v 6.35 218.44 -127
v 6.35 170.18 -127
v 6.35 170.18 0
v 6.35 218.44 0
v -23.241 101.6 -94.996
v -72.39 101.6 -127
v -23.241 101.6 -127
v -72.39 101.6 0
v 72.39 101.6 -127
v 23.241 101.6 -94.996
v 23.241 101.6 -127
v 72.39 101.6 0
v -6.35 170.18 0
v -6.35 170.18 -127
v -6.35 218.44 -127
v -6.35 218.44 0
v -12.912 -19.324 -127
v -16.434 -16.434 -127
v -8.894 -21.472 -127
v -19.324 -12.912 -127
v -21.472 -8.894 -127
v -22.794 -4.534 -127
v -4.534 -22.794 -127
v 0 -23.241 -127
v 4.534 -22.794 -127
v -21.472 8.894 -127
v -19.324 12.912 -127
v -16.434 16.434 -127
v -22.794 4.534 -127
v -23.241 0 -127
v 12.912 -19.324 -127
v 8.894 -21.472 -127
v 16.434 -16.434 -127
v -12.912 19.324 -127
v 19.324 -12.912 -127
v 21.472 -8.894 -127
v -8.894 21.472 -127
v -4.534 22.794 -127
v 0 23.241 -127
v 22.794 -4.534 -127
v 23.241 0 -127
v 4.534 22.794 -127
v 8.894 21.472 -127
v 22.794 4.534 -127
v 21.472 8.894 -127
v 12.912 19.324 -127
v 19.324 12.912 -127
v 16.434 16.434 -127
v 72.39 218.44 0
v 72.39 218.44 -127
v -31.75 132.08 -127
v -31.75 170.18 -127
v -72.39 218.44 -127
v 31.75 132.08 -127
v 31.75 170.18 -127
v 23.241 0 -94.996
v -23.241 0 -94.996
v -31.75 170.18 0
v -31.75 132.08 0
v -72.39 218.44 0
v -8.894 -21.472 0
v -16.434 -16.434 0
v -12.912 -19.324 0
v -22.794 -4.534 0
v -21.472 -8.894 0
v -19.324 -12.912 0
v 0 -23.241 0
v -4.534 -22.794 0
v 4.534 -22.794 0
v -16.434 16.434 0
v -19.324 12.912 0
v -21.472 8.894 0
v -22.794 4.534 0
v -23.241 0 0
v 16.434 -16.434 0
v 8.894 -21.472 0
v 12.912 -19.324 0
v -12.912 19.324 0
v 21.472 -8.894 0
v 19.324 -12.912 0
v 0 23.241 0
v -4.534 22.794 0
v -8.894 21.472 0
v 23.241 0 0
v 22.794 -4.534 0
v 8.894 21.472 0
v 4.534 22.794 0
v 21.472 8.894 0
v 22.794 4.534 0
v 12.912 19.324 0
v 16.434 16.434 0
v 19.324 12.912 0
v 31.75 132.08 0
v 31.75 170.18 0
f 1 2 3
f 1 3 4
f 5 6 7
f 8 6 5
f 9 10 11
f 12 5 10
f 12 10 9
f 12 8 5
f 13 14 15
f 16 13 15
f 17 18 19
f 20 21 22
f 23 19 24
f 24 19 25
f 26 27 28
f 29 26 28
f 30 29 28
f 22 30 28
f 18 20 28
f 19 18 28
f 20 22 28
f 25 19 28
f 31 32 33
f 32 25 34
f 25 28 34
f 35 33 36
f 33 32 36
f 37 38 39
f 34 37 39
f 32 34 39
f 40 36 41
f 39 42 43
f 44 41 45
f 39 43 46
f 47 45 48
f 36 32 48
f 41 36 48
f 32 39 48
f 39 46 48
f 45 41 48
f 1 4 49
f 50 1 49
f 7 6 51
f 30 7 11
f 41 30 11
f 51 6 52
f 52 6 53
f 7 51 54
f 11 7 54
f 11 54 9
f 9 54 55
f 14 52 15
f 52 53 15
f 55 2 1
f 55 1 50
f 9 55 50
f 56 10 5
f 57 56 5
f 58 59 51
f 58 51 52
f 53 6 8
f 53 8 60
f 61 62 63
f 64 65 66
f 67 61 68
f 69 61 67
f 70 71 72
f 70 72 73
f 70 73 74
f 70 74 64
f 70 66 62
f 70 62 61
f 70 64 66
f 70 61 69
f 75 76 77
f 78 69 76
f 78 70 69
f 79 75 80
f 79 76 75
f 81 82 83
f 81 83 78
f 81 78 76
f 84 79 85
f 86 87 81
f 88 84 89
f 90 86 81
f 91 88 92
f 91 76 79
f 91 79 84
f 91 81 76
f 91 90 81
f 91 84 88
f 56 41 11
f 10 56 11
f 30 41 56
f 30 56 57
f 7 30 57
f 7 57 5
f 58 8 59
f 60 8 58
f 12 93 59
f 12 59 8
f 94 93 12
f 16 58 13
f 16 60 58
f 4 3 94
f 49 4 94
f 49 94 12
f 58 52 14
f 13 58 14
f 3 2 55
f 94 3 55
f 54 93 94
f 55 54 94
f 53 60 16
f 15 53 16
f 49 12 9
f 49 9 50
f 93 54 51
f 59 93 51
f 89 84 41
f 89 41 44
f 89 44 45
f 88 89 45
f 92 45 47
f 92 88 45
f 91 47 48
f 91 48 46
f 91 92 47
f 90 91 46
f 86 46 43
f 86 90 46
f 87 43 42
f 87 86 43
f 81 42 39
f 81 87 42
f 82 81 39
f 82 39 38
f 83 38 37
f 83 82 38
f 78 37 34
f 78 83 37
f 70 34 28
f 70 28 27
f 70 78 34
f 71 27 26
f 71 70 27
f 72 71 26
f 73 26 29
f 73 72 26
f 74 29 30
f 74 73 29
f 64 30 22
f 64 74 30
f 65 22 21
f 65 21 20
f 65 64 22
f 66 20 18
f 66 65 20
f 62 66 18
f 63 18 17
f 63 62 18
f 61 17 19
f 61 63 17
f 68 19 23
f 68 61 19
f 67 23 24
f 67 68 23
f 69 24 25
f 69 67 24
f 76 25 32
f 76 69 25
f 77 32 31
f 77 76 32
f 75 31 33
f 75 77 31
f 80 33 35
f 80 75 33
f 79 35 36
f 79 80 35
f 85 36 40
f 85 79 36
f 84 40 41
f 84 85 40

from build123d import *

# Parameters (mm, degrees)
SKETCH1_R    = 23.241
FTA_DEPTH    = 127
SKETCH2_W    = 46.482
SKETCH2_H    = 101.6
FTB_DEPTH    = 32.004
FTC_DEPTH    = 127
SKETCH4_W    = 40.64
SKETCH4_H    = 38.1
FTD1_DEPTH   = 127
SKETCH4_5_W  = 40.64
SKETCH4_5_H  = 38.1
FTD2_DEPTH   = 127
SKETCH5_W    = 25.4
SKETCH5_H    = 48.26
FTE_DEPTH    = 127
FTE_2_DEPTH  = 127
SKETCH6_W    = 40.64
SKETCH6_H    = 48.26
SKETCH6_H_2  = 30.48
FILLER_DEPTH = 127


with BuildPart() as part:
    # Sketch1 → ftA (new body)
    with BuildSketch(Plane.XY):
        Circle(SKETCH1_R)
    extrude(amount=-FTA_DEPTH)


with BuildPart() as body_2:
    # Sketch2 → ftB (new body)
    with BuildSketch(Plane(origin=(0, 0, -127), x_dir=(-1, 0, 0), z_dir=(0, 0, -1))):
        with Locations((0, 50.8)):
            Rectangle(SKETCH2_W, SKETCH2_H)
    extrude(amount=-FTB_DEPTH)

    # Sketch3 → ftC (add)
    with BuildSketch(Plane(origin=(0, 0, -127), x_dir=(-1, 0, 0), z_dir=(0, 0, -1))):
        Polygon((-23.241, 101.6), (-31.75, 101.6), (-31.75, 132.08), (31.75, 132.08), (31.75, 101.6), (23.241, 101.6), align=None)
    extrude(amount=-FTC_DEPTH)



with BuildPart() as body_3:
    # Sketch4 → ftD1 (new body)
    with BuildSketch(Plane.XY):
        with Locations((52.07, 151.13)):
            Rectangle(SKETCH4_W, SKETCH4_H)
    extrude(amount=-FTD1_DEPTH)

    # Sketch4<5> → ftD2 (add)
    with BuildSketch(Plane.XY):
        with Locations((-52.07, 151.13)):
            Rectangle(SKETCH4_5_W, SKETCH4_5_H)
        with Locations((52.07, 151.13)):
            Rectangle(SKETCH4_5_W, SKETCH4_5_H)
    extrude(amount=-FTD2_DEPTH)


with BuildPart() as ftd2_piece_1:
    # of the separate pieces the step leaves, piece 1, a body of its own (ftd2_pieces)
    add(body_3.part.solids().sort_by_distance((31.75, 132.08, 0))[0])


with BuildPart() as ftd2_piece_2:
    # of the separate pieces the step leaves, piece 2, a body of its own (ftd2_pieces)
    add(body_3.part.solids().sort_by_distance((-31.75, 132.08, 0))[0])


with BuildPart() as body_5:
    # Sketch5 → ftE (new body)
    with BuildSketch(Plane.XY):
        with Locations((-19.05, 194.31)):
            Rectangle(SKETCH5_W, SKETCH5_H)
    extrude(amount=-FTE_DEPTH)


with BuildPart() as body_6:
    # Sketch5 → ftE 2 (new body)
    with BuildSketch(Plane.XY):
        with Locations((19.05, 194.31)):
            Rectangle(SKETCH5_W, SKETCH5_H)
    extrude(amount=-FTE_2_DEPTH)


with BuildPart() as body_2_1:
    add(body_2.part)

    add(ftd2_piece_1.part)  # Filler merges ftD2 piece 1

    add(ftd2_piece_2.part)  # Filler merges ftD2 piece 2

    add(body_5.part)  # Filler merges body 5

    add(body_6.part)  # Filler merges body 6
    # Sketch6 → Filler (add)
    with BuildSketch(Plane.XY):
        with Locations((52.07, 194.31)):
            Rectangle(SKETCH6_W, SKETCH6_H)
        with Locations((-52.07, 194.31)):
            Rectangle(SKETCH6_W, SKETCH6_H)
        with Locations((-52.07, 116.84)):
            Rectangle(SKETCH6_W, SKETCH6_H_2)
        with Locations((52.07, 116.84)):
            Rectangle(SKETCH6_W, SKETCH6_H_2)
    extrude(amount=-FILLER_DEPTH)


solid = Compound([part.part, body_2_1.part])
